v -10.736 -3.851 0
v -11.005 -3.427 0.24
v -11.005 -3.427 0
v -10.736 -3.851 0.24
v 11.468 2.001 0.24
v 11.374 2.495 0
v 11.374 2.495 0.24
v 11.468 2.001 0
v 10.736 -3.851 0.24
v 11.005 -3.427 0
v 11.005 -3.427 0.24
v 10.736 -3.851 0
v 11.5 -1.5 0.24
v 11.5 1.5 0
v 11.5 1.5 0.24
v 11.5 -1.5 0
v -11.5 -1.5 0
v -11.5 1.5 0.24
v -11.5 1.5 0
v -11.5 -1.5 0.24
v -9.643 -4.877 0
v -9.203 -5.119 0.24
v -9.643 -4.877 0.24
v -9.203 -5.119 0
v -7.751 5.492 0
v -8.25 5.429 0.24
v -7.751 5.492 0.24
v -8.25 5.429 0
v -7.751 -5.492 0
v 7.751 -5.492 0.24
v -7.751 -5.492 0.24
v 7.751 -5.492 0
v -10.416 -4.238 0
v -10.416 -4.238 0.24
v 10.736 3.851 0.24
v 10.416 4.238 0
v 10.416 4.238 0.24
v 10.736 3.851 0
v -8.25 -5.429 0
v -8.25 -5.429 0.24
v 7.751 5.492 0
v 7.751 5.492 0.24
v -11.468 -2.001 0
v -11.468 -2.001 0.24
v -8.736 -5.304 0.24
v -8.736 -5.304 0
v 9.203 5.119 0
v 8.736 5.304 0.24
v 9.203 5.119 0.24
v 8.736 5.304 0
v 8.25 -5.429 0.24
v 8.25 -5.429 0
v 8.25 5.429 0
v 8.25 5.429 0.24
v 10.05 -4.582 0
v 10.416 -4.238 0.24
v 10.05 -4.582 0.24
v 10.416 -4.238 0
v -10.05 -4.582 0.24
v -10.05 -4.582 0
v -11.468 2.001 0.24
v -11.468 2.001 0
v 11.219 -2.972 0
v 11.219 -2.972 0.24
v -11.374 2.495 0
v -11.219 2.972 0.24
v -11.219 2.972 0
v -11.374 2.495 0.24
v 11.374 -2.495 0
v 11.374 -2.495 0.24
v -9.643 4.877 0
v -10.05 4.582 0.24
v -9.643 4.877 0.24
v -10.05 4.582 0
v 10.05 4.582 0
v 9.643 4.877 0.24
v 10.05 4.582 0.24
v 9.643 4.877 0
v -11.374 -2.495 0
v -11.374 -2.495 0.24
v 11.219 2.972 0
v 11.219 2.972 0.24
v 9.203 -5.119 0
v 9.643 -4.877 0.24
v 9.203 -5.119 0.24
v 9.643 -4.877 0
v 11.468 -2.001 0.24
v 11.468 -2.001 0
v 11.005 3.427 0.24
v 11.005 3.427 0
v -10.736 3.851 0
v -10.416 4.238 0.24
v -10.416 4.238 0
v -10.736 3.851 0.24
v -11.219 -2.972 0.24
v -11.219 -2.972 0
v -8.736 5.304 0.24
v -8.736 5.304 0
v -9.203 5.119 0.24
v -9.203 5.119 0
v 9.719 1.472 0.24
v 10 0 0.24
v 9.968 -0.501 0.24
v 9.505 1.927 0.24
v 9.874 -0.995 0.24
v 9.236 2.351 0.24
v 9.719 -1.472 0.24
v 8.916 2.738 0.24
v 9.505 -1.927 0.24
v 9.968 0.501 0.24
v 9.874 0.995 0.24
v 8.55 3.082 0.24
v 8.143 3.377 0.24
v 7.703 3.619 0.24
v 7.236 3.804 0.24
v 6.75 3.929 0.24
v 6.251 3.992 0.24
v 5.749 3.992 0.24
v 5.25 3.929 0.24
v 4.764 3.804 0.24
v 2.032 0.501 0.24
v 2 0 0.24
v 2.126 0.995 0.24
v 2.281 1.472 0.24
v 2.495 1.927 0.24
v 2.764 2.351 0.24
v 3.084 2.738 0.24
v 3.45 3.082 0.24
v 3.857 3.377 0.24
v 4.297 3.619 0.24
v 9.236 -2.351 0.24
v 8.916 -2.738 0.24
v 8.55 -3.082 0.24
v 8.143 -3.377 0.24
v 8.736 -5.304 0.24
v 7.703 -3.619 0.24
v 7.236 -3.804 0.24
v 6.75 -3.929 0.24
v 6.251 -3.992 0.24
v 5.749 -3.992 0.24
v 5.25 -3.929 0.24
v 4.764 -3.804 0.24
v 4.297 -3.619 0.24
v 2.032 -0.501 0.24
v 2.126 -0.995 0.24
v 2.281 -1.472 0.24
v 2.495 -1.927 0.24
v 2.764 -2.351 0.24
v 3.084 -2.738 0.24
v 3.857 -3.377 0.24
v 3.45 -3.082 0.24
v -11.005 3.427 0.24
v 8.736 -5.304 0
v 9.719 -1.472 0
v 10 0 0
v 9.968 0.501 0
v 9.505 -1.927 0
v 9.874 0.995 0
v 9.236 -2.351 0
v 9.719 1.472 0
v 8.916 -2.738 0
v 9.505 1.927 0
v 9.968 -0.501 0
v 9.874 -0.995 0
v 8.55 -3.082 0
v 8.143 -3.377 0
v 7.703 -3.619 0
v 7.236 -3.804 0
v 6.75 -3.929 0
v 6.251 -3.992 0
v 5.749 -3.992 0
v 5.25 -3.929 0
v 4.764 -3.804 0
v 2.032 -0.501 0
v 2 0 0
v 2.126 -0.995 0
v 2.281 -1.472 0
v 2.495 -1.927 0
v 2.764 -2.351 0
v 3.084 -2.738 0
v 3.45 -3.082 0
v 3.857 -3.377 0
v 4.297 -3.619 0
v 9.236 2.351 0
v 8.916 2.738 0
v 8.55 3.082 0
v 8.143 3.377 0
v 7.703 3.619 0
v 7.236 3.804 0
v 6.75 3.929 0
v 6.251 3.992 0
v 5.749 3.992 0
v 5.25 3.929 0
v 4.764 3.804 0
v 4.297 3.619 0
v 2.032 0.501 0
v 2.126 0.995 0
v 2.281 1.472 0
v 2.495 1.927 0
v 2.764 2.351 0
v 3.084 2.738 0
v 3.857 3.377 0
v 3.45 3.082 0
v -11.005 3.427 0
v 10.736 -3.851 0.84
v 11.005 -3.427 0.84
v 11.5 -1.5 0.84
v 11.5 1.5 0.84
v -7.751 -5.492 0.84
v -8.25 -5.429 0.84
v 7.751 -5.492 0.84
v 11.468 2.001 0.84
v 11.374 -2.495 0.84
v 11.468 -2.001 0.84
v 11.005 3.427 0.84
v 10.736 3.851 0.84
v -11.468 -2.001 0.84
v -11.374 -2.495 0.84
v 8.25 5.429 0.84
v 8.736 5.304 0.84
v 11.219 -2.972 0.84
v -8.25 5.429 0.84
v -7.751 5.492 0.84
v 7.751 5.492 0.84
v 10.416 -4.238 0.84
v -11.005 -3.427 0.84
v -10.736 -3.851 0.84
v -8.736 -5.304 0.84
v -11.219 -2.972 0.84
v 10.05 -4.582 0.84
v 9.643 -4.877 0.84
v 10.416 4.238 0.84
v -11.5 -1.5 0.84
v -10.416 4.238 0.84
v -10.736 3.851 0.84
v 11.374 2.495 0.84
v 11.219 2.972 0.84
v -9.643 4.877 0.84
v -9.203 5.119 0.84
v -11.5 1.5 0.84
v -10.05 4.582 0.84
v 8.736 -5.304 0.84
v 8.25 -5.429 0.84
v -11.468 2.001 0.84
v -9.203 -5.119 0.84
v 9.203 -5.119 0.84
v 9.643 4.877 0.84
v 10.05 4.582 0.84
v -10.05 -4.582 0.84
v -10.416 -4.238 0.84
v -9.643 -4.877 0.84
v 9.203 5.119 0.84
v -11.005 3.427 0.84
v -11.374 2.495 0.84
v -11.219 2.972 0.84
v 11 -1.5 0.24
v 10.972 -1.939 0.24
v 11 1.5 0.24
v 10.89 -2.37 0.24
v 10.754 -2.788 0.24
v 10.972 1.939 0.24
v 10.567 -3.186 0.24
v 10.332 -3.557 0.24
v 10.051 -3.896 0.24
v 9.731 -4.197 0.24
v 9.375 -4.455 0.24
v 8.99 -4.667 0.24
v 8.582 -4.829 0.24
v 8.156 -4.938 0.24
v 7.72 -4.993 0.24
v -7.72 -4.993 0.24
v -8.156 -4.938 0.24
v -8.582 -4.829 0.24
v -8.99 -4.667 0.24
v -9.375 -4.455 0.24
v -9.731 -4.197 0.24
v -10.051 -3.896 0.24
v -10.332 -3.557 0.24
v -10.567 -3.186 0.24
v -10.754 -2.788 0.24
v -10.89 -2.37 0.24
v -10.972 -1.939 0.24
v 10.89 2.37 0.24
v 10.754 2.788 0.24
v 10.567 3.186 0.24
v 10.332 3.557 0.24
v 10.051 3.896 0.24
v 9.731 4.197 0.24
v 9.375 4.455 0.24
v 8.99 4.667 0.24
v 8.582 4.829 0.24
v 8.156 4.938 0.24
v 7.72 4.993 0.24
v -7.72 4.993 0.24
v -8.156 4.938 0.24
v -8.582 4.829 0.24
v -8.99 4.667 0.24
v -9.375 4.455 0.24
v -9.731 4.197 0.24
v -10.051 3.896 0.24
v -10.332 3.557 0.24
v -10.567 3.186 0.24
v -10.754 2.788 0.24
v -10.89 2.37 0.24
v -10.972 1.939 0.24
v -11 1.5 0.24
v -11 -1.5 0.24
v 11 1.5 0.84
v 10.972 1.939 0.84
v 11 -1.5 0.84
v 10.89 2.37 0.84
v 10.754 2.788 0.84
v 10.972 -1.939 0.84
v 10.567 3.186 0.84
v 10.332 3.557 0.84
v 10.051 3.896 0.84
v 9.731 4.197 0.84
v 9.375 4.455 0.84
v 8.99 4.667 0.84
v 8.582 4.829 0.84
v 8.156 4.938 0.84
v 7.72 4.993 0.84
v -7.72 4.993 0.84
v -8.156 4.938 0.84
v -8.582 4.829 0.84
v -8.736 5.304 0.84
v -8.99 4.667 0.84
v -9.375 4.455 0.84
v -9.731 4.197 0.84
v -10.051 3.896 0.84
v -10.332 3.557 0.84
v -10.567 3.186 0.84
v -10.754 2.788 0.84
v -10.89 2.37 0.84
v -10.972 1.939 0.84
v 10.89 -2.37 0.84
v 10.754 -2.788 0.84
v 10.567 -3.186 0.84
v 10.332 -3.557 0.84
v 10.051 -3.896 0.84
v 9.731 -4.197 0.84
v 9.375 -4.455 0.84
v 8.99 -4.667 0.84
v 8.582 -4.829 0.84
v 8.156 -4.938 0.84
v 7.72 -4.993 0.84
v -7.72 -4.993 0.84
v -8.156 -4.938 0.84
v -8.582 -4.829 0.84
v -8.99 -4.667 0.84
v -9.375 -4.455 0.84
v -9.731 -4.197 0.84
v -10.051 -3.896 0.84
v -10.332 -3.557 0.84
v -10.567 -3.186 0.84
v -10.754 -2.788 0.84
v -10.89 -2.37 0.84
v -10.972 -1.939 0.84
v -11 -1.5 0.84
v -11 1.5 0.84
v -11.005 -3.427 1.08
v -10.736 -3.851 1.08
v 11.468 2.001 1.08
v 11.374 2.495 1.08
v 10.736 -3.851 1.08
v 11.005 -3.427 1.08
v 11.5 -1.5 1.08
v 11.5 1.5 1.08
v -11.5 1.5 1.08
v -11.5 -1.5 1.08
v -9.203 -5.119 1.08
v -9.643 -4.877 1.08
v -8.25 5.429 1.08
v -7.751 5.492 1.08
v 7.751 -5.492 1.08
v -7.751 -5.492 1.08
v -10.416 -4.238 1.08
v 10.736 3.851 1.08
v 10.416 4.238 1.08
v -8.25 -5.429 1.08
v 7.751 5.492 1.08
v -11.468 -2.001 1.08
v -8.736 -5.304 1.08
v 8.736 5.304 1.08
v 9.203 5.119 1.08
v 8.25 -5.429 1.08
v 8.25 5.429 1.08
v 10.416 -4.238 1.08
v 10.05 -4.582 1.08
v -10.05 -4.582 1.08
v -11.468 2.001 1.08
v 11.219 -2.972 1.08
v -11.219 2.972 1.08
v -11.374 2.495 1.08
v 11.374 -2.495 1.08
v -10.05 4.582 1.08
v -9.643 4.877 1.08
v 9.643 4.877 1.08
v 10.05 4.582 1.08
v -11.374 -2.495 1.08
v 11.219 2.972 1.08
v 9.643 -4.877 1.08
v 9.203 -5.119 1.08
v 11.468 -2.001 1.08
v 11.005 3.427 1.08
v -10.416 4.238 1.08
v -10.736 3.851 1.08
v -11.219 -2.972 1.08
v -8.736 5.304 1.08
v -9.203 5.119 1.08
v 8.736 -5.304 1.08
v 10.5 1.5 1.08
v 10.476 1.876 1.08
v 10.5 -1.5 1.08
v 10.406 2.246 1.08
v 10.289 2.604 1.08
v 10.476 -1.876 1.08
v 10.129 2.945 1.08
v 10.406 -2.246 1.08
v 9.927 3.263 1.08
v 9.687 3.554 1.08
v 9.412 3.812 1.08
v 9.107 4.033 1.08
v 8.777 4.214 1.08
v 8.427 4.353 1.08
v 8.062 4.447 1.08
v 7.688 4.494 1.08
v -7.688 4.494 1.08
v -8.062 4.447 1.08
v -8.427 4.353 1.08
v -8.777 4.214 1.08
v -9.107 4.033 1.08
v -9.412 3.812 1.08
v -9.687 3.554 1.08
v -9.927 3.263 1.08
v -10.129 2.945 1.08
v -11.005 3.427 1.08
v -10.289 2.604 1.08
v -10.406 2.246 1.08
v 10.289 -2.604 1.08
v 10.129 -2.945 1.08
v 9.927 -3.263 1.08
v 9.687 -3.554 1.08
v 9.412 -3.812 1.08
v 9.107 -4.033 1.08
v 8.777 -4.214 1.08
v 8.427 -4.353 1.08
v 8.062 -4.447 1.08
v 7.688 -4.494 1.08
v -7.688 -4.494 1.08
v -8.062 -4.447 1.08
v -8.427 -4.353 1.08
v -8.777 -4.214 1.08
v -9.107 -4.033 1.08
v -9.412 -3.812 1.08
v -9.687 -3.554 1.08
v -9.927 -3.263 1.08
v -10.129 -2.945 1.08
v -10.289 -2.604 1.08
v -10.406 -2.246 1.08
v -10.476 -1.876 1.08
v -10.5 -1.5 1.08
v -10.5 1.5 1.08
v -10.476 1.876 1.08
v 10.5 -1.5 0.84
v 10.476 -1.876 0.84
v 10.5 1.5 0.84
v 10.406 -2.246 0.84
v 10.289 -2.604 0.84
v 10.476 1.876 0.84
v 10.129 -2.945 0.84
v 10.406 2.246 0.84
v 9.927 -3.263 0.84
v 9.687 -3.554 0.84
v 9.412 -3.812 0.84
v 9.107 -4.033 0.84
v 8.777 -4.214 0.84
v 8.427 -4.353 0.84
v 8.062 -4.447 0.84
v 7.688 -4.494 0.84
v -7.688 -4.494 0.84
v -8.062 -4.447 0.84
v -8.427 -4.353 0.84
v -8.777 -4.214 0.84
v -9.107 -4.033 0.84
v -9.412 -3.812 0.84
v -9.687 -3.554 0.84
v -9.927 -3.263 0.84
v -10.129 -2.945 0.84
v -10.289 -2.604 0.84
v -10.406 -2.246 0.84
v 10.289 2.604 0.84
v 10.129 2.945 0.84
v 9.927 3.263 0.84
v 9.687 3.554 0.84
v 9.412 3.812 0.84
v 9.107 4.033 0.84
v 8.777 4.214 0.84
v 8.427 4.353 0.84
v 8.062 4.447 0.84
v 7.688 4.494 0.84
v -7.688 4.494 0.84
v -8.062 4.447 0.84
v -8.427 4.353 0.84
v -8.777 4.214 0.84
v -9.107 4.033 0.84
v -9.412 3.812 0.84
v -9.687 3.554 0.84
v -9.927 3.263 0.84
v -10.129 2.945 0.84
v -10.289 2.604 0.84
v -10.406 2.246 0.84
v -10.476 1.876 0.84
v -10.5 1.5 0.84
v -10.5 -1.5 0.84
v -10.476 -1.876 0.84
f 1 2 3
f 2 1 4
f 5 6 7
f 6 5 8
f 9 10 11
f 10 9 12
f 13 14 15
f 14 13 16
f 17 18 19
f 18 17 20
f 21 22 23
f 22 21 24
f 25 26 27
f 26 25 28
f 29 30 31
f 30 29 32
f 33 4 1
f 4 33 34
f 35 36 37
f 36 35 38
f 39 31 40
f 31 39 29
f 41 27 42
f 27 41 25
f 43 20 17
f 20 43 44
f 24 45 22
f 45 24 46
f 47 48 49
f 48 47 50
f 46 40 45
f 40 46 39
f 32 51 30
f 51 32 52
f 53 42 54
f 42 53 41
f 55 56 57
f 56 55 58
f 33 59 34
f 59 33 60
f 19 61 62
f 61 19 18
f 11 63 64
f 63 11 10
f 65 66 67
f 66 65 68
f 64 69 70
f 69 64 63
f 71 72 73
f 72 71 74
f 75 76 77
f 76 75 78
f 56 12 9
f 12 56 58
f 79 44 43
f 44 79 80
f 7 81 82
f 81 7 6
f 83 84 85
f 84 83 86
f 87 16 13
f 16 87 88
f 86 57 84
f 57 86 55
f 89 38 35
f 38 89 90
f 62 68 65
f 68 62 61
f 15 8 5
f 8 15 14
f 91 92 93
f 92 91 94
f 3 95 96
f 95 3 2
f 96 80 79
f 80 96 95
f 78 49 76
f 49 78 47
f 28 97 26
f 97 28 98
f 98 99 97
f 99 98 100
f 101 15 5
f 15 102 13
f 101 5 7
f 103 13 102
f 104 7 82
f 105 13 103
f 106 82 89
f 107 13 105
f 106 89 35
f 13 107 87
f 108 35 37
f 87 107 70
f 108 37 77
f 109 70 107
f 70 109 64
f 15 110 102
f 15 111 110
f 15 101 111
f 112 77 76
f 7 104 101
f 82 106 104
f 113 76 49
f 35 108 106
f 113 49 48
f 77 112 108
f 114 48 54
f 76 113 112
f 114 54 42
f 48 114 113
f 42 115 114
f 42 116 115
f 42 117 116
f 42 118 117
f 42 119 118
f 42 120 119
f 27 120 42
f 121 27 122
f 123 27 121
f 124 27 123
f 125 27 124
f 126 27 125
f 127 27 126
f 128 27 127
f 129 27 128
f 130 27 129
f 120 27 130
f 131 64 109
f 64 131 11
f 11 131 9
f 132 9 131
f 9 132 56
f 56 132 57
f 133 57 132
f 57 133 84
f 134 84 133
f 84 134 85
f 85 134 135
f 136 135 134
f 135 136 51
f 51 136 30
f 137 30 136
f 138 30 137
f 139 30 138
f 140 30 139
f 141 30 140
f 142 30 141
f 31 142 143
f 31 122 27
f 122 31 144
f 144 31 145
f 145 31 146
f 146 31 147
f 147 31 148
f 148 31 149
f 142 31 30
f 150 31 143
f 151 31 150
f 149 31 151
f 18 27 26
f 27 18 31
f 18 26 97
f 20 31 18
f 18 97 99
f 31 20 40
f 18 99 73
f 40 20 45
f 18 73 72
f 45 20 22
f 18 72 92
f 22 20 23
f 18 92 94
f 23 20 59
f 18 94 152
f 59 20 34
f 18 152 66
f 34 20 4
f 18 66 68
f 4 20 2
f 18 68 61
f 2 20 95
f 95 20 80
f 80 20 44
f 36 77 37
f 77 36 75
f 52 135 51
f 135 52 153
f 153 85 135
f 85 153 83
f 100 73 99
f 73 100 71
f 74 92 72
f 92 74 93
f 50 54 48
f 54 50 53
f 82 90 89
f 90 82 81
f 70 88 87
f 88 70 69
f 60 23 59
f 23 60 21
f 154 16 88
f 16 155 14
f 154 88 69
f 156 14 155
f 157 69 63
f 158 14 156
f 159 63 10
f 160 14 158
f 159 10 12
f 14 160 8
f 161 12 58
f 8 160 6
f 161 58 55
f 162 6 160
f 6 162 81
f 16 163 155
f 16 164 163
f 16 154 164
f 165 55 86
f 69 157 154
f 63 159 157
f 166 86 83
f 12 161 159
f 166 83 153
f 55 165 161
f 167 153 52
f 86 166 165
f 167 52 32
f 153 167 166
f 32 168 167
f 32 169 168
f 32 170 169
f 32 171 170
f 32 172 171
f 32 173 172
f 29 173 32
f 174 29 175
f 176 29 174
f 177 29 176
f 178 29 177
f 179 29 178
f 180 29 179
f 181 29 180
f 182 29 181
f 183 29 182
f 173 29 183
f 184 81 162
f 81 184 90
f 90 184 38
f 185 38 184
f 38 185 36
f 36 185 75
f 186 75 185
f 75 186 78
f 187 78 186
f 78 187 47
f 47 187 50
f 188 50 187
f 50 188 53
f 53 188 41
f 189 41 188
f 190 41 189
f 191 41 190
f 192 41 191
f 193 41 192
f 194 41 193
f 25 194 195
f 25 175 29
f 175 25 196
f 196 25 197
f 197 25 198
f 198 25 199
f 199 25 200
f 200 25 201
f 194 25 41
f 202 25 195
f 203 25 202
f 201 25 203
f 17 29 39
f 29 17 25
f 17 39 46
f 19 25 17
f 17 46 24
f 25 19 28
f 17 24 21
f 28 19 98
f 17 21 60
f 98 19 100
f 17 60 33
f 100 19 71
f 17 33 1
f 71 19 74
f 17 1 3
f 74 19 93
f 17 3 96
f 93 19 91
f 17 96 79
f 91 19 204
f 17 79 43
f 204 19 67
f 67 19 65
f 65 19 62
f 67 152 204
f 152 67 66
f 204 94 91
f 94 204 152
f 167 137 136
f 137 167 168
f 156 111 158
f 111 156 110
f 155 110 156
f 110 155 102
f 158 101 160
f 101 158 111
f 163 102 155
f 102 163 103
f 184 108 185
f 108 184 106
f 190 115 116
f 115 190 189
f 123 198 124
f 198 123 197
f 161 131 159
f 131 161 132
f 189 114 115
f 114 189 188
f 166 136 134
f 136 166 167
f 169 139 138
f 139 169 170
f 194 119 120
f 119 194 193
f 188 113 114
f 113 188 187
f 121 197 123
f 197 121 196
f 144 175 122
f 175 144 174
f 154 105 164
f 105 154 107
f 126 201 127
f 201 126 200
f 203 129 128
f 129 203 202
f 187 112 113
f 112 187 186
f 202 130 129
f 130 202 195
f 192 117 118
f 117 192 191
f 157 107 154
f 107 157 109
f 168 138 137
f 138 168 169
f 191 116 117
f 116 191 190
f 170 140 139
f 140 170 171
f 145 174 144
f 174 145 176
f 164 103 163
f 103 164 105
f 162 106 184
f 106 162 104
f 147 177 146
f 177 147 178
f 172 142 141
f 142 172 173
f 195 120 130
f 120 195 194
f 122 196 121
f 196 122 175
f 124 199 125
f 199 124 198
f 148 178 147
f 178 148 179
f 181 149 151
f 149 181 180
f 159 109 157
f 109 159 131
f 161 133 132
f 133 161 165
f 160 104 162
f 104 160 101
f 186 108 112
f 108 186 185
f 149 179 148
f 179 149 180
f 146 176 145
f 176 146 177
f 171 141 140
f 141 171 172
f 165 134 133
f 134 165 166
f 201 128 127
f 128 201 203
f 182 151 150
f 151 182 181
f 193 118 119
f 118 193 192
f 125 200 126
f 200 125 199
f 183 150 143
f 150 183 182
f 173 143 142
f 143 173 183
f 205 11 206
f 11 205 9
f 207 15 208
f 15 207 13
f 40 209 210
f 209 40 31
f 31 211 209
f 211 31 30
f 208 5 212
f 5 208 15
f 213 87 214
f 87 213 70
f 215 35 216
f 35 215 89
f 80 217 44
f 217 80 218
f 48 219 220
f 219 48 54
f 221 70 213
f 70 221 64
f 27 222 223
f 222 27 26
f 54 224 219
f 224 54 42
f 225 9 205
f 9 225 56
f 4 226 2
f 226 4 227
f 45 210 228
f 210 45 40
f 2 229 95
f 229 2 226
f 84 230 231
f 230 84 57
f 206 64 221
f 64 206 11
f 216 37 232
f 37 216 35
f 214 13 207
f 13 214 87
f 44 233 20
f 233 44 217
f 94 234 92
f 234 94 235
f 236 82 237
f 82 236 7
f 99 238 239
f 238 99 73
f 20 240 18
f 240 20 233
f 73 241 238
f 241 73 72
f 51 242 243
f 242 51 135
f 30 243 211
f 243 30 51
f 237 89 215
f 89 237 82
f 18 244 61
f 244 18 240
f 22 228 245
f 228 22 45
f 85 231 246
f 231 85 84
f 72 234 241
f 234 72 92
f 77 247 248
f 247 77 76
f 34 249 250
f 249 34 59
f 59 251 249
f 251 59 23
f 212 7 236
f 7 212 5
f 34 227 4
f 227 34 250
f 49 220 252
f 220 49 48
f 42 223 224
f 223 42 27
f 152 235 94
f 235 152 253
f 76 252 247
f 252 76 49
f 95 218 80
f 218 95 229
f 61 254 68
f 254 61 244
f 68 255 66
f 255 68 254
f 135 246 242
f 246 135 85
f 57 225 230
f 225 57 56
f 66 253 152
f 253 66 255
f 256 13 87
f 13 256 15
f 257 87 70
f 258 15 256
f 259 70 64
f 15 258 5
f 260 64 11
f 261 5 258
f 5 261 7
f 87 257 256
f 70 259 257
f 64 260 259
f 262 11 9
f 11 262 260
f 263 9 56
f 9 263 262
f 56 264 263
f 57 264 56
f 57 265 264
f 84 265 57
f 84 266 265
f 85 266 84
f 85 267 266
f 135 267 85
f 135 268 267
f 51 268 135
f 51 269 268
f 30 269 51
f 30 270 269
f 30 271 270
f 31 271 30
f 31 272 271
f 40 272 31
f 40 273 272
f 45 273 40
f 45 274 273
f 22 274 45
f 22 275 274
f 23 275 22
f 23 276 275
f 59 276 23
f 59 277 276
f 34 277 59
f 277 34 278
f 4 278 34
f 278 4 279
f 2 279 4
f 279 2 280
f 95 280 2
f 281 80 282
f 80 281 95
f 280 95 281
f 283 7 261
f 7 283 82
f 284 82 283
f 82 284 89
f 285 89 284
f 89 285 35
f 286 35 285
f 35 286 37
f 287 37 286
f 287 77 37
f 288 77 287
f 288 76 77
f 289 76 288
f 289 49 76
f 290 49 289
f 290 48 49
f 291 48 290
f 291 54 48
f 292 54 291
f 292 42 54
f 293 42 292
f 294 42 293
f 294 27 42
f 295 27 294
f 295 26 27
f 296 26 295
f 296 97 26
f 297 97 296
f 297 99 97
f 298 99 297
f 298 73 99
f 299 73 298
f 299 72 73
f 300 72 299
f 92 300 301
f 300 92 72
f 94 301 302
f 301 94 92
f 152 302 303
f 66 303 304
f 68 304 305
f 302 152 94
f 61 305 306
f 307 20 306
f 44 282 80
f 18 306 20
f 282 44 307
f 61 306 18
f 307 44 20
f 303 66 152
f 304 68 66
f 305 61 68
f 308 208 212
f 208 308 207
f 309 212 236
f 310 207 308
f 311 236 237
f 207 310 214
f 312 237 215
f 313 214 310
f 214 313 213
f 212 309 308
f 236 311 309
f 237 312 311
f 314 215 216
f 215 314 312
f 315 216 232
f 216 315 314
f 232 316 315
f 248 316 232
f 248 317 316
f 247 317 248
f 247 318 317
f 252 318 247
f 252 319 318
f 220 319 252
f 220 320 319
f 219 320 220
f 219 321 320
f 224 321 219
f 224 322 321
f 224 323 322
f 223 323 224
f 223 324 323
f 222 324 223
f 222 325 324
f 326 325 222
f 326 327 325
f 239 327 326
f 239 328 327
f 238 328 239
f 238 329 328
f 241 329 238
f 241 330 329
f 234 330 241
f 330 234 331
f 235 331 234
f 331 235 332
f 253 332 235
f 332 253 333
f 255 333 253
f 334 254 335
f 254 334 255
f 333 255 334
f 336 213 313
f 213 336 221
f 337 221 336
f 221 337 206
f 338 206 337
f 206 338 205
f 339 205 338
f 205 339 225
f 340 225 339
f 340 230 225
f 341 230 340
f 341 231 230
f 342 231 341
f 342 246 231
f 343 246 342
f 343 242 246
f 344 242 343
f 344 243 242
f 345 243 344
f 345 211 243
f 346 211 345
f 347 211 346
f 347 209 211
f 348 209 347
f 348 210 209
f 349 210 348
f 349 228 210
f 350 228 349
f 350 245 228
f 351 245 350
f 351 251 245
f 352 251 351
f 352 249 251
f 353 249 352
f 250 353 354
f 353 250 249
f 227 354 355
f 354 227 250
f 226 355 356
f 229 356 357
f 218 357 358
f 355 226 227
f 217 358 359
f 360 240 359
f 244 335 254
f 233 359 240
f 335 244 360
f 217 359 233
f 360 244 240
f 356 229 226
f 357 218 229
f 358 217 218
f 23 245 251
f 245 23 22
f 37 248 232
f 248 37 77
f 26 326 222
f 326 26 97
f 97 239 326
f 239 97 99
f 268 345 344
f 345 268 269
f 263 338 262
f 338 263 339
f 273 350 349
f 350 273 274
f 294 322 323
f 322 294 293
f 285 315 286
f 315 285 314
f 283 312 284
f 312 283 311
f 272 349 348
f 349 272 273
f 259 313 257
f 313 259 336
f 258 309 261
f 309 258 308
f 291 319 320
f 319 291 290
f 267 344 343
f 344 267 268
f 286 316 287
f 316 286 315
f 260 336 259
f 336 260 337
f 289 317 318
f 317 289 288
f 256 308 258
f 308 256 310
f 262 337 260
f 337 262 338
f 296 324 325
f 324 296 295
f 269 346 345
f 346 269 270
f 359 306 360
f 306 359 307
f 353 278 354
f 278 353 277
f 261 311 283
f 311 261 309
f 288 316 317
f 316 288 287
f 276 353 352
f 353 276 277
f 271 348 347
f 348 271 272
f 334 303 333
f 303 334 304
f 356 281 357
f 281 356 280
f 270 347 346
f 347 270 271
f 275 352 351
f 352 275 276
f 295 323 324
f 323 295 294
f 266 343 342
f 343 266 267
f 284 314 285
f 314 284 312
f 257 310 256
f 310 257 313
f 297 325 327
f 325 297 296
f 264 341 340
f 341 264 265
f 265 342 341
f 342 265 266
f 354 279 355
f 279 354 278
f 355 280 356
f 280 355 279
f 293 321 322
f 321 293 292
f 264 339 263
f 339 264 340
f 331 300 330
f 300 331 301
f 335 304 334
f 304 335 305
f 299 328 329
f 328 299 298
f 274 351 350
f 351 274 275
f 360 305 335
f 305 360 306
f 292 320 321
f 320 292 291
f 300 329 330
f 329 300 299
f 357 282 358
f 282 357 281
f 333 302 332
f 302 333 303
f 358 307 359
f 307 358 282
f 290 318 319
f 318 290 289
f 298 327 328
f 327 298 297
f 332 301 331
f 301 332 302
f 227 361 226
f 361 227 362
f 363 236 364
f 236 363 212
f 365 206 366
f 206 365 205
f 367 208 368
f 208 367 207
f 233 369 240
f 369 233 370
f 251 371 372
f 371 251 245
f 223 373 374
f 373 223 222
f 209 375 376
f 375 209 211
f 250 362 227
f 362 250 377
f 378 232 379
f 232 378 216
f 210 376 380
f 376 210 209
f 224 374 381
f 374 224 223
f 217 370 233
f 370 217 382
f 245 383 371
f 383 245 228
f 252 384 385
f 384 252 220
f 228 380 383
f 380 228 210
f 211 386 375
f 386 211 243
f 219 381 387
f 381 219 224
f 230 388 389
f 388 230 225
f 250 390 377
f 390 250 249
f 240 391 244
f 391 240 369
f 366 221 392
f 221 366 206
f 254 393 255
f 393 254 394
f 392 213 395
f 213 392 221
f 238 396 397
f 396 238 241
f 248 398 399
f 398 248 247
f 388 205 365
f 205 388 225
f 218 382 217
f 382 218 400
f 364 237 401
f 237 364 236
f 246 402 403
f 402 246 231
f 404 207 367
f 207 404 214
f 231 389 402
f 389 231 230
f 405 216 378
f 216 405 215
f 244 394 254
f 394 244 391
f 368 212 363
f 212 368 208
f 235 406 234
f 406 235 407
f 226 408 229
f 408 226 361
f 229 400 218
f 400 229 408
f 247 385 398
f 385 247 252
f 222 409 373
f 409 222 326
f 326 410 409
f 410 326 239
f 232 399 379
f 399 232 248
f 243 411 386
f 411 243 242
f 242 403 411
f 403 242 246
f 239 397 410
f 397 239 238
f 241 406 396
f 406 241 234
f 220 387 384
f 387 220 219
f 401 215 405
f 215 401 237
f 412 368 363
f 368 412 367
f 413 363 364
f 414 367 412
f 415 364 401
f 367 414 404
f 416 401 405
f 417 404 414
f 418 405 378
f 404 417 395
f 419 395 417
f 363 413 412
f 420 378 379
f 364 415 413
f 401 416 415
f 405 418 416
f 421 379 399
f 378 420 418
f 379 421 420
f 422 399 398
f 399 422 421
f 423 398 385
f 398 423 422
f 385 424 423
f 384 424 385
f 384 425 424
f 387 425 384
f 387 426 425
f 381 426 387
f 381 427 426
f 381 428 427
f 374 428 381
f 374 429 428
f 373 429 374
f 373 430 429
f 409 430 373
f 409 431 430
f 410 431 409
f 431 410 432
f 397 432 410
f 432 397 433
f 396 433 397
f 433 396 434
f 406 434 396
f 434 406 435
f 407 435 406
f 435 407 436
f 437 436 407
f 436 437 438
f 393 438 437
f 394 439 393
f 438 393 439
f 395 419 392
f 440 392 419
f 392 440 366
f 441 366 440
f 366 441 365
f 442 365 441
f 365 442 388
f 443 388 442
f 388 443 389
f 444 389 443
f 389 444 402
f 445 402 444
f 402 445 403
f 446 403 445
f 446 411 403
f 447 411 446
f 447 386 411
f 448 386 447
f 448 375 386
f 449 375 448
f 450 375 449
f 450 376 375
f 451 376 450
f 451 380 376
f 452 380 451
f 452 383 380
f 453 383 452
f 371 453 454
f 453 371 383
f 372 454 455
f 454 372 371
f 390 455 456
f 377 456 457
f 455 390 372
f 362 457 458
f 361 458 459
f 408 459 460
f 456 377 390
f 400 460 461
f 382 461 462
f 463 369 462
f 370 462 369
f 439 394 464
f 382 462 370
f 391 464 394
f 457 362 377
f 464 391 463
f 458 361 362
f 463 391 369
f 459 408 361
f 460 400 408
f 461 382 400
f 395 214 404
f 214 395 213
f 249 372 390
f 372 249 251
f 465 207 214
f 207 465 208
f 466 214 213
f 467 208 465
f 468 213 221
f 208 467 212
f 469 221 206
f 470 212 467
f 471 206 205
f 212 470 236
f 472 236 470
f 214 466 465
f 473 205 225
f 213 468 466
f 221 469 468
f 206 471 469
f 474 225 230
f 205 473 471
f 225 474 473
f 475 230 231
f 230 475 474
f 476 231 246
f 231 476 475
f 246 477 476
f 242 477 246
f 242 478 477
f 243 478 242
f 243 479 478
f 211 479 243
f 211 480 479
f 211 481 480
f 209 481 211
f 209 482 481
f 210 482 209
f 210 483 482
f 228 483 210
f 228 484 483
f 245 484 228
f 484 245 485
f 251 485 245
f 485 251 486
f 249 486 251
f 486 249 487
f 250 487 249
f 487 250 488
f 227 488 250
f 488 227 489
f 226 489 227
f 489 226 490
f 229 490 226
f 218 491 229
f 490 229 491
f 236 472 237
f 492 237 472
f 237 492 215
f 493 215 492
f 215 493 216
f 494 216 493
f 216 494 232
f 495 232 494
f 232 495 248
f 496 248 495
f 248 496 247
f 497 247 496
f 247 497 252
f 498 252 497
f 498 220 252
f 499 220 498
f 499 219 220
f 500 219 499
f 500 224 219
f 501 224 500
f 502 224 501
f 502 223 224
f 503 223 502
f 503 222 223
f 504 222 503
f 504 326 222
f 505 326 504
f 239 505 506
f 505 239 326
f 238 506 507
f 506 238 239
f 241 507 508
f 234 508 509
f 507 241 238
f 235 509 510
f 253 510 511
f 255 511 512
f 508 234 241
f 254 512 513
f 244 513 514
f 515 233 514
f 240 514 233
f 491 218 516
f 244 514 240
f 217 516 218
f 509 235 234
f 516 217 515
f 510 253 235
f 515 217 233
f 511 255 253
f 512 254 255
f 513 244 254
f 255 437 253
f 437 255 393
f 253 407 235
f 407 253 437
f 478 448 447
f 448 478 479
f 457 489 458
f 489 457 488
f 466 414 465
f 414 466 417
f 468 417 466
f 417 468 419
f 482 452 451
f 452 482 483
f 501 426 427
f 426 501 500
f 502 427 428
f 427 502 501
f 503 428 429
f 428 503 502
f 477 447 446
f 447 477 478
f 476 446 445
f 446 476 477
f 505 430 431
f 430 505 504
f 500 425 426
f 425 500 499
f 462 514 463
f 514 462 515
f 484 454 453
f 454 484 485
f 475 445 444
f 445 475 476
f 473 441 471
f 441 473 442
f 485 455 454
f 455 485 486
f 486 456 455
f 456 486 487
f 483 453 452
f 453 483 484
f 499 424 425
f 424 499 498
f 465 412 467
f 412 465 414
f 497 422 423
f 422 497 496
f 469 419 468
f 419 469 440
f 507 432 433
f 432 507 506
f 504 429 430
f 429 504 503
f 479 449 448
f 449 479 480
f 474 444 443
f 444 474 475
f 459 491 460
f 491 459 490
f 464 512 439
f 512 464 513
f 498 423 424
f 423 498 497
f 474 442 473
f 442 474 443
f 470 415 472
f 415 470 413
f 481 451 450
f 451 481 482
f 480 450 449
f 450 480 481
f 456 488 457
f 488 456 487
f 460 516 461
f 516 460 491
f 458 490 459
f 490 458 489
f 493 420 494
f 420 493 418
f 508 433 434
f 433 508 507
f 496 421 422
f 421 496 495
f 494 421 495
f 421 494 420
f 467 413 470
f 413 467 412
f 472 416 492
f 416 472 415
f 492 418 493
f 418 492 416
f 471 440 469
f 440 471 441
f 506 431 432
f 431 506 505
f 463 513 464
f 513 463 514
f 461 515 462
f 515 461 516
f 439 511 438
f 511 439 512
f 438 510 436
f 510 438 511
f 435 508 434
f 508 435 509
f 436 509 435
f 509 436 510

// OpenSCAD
// file: Parameter.scad
$fn=50;
overlap=0.006;
thinnestLayerOfPrinter=0.12;

baseX=23;
baseY=11;
baseZ=thinnestLayerOfPrinter*2;

wallZ=thinnestLayerOfPrinter*5;
wallThickness=0.5;

coverZ=thinnestLayerOfPrinter*2;

cornerRadius=4;

holeDeltaX=6.0;
holeDiameter=8;

deltaSlider=0.4;
sliderX=12-deltaSlider*2;
sliderY=baseY-wallThickness-deltaSlider;
sliderZ=thinnestLayerOfPrinter*3;
// main file
include <Parameter.scad>

baseZtop=baseZ;
baseZdelta=baseZ/2;

wallZtop=baseZtop+wallZ;
wallZdelta=baseZtop+wallZ/2;

coverZtop=wallZtop+coverZ;
coverZdelta=wallZtop+coverZ/2;
coverDelta=1.0;

//use <Switch.scad>

lensCover();

//color("green")
//translate([6,0,1])
//slider();

//color("green")
//translate([-5,2,1])
//slider();


module lensCover(){
    difference()
    {
        color("#339999")
        translate([0,0,baseZdelta])
        base(thickness=baseZ);

        translate([holeDeltaX,0,0])
        cylinder(h=10,d=holeDiameter,center=true);
    }
    color("#66cccc")
    translate([0,0,wallZdelta])
    wall();
    color("#339999")
    translate([0,0,coverZdelta])
    cover();
}

module base(delta=0,thickness){
    radius=cornerRadius-delta;
    hull()
    {
        translate([-(baseX-delta*2)/2+radius,(baseY-delta*2)/2-radius,0])
        cylinder(h=thickness,r=radius,center=true);

        translate([(baseX-delta*2)/2-radius,(baseY-delta*2)/2-radius,0])
        cylinder(h=thickness,r=radius,center=true);

        translate([-(baseX-delta*2)/2+radius,-(baseY-delta*2)/2+radius,0])
        cylinder(h=thickness,r=radius,center=true);

        translate([(baseX-delta*2)/2-radius,-(baseY-delta*2)/2+radius,0])
        cylinder(h=thickness+delta,r=radius,center=true);
    }
}

module wall(){
    difference()
    {
        base(thickness=wallZ);
        base(delta=wallThickness,thickness=wallZ+overlap);
    }
}

module cover(){
    difference()
    {
        base(thickness=coverZ);
        base(delta=coverDelta,thickness=coverZ);
    }
}
